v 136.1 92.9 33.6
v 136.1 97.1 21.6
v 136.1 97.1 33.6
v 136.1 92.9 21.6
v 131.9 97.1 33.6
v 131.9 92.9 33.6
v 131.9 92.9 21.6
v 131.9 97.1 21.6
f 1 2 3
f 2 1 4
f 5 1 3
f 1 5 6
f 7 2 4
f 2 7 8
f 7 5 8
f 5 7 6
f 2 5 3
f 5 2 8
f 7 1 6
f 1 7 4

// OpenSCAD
// Generated by spec/prepare_parent_retrofit_printing.py from validated release fasteners. NOT A PRINTABLE PART.
union(){
translate([131.9, 92.9, 21.599999237060548]) cube([4.2, 4.2, 12.00000228881836]);
translate([131.9, 92.9, 21.599999237060548]) cube([4.2, 4.2, 12.00000228881836]);
}
